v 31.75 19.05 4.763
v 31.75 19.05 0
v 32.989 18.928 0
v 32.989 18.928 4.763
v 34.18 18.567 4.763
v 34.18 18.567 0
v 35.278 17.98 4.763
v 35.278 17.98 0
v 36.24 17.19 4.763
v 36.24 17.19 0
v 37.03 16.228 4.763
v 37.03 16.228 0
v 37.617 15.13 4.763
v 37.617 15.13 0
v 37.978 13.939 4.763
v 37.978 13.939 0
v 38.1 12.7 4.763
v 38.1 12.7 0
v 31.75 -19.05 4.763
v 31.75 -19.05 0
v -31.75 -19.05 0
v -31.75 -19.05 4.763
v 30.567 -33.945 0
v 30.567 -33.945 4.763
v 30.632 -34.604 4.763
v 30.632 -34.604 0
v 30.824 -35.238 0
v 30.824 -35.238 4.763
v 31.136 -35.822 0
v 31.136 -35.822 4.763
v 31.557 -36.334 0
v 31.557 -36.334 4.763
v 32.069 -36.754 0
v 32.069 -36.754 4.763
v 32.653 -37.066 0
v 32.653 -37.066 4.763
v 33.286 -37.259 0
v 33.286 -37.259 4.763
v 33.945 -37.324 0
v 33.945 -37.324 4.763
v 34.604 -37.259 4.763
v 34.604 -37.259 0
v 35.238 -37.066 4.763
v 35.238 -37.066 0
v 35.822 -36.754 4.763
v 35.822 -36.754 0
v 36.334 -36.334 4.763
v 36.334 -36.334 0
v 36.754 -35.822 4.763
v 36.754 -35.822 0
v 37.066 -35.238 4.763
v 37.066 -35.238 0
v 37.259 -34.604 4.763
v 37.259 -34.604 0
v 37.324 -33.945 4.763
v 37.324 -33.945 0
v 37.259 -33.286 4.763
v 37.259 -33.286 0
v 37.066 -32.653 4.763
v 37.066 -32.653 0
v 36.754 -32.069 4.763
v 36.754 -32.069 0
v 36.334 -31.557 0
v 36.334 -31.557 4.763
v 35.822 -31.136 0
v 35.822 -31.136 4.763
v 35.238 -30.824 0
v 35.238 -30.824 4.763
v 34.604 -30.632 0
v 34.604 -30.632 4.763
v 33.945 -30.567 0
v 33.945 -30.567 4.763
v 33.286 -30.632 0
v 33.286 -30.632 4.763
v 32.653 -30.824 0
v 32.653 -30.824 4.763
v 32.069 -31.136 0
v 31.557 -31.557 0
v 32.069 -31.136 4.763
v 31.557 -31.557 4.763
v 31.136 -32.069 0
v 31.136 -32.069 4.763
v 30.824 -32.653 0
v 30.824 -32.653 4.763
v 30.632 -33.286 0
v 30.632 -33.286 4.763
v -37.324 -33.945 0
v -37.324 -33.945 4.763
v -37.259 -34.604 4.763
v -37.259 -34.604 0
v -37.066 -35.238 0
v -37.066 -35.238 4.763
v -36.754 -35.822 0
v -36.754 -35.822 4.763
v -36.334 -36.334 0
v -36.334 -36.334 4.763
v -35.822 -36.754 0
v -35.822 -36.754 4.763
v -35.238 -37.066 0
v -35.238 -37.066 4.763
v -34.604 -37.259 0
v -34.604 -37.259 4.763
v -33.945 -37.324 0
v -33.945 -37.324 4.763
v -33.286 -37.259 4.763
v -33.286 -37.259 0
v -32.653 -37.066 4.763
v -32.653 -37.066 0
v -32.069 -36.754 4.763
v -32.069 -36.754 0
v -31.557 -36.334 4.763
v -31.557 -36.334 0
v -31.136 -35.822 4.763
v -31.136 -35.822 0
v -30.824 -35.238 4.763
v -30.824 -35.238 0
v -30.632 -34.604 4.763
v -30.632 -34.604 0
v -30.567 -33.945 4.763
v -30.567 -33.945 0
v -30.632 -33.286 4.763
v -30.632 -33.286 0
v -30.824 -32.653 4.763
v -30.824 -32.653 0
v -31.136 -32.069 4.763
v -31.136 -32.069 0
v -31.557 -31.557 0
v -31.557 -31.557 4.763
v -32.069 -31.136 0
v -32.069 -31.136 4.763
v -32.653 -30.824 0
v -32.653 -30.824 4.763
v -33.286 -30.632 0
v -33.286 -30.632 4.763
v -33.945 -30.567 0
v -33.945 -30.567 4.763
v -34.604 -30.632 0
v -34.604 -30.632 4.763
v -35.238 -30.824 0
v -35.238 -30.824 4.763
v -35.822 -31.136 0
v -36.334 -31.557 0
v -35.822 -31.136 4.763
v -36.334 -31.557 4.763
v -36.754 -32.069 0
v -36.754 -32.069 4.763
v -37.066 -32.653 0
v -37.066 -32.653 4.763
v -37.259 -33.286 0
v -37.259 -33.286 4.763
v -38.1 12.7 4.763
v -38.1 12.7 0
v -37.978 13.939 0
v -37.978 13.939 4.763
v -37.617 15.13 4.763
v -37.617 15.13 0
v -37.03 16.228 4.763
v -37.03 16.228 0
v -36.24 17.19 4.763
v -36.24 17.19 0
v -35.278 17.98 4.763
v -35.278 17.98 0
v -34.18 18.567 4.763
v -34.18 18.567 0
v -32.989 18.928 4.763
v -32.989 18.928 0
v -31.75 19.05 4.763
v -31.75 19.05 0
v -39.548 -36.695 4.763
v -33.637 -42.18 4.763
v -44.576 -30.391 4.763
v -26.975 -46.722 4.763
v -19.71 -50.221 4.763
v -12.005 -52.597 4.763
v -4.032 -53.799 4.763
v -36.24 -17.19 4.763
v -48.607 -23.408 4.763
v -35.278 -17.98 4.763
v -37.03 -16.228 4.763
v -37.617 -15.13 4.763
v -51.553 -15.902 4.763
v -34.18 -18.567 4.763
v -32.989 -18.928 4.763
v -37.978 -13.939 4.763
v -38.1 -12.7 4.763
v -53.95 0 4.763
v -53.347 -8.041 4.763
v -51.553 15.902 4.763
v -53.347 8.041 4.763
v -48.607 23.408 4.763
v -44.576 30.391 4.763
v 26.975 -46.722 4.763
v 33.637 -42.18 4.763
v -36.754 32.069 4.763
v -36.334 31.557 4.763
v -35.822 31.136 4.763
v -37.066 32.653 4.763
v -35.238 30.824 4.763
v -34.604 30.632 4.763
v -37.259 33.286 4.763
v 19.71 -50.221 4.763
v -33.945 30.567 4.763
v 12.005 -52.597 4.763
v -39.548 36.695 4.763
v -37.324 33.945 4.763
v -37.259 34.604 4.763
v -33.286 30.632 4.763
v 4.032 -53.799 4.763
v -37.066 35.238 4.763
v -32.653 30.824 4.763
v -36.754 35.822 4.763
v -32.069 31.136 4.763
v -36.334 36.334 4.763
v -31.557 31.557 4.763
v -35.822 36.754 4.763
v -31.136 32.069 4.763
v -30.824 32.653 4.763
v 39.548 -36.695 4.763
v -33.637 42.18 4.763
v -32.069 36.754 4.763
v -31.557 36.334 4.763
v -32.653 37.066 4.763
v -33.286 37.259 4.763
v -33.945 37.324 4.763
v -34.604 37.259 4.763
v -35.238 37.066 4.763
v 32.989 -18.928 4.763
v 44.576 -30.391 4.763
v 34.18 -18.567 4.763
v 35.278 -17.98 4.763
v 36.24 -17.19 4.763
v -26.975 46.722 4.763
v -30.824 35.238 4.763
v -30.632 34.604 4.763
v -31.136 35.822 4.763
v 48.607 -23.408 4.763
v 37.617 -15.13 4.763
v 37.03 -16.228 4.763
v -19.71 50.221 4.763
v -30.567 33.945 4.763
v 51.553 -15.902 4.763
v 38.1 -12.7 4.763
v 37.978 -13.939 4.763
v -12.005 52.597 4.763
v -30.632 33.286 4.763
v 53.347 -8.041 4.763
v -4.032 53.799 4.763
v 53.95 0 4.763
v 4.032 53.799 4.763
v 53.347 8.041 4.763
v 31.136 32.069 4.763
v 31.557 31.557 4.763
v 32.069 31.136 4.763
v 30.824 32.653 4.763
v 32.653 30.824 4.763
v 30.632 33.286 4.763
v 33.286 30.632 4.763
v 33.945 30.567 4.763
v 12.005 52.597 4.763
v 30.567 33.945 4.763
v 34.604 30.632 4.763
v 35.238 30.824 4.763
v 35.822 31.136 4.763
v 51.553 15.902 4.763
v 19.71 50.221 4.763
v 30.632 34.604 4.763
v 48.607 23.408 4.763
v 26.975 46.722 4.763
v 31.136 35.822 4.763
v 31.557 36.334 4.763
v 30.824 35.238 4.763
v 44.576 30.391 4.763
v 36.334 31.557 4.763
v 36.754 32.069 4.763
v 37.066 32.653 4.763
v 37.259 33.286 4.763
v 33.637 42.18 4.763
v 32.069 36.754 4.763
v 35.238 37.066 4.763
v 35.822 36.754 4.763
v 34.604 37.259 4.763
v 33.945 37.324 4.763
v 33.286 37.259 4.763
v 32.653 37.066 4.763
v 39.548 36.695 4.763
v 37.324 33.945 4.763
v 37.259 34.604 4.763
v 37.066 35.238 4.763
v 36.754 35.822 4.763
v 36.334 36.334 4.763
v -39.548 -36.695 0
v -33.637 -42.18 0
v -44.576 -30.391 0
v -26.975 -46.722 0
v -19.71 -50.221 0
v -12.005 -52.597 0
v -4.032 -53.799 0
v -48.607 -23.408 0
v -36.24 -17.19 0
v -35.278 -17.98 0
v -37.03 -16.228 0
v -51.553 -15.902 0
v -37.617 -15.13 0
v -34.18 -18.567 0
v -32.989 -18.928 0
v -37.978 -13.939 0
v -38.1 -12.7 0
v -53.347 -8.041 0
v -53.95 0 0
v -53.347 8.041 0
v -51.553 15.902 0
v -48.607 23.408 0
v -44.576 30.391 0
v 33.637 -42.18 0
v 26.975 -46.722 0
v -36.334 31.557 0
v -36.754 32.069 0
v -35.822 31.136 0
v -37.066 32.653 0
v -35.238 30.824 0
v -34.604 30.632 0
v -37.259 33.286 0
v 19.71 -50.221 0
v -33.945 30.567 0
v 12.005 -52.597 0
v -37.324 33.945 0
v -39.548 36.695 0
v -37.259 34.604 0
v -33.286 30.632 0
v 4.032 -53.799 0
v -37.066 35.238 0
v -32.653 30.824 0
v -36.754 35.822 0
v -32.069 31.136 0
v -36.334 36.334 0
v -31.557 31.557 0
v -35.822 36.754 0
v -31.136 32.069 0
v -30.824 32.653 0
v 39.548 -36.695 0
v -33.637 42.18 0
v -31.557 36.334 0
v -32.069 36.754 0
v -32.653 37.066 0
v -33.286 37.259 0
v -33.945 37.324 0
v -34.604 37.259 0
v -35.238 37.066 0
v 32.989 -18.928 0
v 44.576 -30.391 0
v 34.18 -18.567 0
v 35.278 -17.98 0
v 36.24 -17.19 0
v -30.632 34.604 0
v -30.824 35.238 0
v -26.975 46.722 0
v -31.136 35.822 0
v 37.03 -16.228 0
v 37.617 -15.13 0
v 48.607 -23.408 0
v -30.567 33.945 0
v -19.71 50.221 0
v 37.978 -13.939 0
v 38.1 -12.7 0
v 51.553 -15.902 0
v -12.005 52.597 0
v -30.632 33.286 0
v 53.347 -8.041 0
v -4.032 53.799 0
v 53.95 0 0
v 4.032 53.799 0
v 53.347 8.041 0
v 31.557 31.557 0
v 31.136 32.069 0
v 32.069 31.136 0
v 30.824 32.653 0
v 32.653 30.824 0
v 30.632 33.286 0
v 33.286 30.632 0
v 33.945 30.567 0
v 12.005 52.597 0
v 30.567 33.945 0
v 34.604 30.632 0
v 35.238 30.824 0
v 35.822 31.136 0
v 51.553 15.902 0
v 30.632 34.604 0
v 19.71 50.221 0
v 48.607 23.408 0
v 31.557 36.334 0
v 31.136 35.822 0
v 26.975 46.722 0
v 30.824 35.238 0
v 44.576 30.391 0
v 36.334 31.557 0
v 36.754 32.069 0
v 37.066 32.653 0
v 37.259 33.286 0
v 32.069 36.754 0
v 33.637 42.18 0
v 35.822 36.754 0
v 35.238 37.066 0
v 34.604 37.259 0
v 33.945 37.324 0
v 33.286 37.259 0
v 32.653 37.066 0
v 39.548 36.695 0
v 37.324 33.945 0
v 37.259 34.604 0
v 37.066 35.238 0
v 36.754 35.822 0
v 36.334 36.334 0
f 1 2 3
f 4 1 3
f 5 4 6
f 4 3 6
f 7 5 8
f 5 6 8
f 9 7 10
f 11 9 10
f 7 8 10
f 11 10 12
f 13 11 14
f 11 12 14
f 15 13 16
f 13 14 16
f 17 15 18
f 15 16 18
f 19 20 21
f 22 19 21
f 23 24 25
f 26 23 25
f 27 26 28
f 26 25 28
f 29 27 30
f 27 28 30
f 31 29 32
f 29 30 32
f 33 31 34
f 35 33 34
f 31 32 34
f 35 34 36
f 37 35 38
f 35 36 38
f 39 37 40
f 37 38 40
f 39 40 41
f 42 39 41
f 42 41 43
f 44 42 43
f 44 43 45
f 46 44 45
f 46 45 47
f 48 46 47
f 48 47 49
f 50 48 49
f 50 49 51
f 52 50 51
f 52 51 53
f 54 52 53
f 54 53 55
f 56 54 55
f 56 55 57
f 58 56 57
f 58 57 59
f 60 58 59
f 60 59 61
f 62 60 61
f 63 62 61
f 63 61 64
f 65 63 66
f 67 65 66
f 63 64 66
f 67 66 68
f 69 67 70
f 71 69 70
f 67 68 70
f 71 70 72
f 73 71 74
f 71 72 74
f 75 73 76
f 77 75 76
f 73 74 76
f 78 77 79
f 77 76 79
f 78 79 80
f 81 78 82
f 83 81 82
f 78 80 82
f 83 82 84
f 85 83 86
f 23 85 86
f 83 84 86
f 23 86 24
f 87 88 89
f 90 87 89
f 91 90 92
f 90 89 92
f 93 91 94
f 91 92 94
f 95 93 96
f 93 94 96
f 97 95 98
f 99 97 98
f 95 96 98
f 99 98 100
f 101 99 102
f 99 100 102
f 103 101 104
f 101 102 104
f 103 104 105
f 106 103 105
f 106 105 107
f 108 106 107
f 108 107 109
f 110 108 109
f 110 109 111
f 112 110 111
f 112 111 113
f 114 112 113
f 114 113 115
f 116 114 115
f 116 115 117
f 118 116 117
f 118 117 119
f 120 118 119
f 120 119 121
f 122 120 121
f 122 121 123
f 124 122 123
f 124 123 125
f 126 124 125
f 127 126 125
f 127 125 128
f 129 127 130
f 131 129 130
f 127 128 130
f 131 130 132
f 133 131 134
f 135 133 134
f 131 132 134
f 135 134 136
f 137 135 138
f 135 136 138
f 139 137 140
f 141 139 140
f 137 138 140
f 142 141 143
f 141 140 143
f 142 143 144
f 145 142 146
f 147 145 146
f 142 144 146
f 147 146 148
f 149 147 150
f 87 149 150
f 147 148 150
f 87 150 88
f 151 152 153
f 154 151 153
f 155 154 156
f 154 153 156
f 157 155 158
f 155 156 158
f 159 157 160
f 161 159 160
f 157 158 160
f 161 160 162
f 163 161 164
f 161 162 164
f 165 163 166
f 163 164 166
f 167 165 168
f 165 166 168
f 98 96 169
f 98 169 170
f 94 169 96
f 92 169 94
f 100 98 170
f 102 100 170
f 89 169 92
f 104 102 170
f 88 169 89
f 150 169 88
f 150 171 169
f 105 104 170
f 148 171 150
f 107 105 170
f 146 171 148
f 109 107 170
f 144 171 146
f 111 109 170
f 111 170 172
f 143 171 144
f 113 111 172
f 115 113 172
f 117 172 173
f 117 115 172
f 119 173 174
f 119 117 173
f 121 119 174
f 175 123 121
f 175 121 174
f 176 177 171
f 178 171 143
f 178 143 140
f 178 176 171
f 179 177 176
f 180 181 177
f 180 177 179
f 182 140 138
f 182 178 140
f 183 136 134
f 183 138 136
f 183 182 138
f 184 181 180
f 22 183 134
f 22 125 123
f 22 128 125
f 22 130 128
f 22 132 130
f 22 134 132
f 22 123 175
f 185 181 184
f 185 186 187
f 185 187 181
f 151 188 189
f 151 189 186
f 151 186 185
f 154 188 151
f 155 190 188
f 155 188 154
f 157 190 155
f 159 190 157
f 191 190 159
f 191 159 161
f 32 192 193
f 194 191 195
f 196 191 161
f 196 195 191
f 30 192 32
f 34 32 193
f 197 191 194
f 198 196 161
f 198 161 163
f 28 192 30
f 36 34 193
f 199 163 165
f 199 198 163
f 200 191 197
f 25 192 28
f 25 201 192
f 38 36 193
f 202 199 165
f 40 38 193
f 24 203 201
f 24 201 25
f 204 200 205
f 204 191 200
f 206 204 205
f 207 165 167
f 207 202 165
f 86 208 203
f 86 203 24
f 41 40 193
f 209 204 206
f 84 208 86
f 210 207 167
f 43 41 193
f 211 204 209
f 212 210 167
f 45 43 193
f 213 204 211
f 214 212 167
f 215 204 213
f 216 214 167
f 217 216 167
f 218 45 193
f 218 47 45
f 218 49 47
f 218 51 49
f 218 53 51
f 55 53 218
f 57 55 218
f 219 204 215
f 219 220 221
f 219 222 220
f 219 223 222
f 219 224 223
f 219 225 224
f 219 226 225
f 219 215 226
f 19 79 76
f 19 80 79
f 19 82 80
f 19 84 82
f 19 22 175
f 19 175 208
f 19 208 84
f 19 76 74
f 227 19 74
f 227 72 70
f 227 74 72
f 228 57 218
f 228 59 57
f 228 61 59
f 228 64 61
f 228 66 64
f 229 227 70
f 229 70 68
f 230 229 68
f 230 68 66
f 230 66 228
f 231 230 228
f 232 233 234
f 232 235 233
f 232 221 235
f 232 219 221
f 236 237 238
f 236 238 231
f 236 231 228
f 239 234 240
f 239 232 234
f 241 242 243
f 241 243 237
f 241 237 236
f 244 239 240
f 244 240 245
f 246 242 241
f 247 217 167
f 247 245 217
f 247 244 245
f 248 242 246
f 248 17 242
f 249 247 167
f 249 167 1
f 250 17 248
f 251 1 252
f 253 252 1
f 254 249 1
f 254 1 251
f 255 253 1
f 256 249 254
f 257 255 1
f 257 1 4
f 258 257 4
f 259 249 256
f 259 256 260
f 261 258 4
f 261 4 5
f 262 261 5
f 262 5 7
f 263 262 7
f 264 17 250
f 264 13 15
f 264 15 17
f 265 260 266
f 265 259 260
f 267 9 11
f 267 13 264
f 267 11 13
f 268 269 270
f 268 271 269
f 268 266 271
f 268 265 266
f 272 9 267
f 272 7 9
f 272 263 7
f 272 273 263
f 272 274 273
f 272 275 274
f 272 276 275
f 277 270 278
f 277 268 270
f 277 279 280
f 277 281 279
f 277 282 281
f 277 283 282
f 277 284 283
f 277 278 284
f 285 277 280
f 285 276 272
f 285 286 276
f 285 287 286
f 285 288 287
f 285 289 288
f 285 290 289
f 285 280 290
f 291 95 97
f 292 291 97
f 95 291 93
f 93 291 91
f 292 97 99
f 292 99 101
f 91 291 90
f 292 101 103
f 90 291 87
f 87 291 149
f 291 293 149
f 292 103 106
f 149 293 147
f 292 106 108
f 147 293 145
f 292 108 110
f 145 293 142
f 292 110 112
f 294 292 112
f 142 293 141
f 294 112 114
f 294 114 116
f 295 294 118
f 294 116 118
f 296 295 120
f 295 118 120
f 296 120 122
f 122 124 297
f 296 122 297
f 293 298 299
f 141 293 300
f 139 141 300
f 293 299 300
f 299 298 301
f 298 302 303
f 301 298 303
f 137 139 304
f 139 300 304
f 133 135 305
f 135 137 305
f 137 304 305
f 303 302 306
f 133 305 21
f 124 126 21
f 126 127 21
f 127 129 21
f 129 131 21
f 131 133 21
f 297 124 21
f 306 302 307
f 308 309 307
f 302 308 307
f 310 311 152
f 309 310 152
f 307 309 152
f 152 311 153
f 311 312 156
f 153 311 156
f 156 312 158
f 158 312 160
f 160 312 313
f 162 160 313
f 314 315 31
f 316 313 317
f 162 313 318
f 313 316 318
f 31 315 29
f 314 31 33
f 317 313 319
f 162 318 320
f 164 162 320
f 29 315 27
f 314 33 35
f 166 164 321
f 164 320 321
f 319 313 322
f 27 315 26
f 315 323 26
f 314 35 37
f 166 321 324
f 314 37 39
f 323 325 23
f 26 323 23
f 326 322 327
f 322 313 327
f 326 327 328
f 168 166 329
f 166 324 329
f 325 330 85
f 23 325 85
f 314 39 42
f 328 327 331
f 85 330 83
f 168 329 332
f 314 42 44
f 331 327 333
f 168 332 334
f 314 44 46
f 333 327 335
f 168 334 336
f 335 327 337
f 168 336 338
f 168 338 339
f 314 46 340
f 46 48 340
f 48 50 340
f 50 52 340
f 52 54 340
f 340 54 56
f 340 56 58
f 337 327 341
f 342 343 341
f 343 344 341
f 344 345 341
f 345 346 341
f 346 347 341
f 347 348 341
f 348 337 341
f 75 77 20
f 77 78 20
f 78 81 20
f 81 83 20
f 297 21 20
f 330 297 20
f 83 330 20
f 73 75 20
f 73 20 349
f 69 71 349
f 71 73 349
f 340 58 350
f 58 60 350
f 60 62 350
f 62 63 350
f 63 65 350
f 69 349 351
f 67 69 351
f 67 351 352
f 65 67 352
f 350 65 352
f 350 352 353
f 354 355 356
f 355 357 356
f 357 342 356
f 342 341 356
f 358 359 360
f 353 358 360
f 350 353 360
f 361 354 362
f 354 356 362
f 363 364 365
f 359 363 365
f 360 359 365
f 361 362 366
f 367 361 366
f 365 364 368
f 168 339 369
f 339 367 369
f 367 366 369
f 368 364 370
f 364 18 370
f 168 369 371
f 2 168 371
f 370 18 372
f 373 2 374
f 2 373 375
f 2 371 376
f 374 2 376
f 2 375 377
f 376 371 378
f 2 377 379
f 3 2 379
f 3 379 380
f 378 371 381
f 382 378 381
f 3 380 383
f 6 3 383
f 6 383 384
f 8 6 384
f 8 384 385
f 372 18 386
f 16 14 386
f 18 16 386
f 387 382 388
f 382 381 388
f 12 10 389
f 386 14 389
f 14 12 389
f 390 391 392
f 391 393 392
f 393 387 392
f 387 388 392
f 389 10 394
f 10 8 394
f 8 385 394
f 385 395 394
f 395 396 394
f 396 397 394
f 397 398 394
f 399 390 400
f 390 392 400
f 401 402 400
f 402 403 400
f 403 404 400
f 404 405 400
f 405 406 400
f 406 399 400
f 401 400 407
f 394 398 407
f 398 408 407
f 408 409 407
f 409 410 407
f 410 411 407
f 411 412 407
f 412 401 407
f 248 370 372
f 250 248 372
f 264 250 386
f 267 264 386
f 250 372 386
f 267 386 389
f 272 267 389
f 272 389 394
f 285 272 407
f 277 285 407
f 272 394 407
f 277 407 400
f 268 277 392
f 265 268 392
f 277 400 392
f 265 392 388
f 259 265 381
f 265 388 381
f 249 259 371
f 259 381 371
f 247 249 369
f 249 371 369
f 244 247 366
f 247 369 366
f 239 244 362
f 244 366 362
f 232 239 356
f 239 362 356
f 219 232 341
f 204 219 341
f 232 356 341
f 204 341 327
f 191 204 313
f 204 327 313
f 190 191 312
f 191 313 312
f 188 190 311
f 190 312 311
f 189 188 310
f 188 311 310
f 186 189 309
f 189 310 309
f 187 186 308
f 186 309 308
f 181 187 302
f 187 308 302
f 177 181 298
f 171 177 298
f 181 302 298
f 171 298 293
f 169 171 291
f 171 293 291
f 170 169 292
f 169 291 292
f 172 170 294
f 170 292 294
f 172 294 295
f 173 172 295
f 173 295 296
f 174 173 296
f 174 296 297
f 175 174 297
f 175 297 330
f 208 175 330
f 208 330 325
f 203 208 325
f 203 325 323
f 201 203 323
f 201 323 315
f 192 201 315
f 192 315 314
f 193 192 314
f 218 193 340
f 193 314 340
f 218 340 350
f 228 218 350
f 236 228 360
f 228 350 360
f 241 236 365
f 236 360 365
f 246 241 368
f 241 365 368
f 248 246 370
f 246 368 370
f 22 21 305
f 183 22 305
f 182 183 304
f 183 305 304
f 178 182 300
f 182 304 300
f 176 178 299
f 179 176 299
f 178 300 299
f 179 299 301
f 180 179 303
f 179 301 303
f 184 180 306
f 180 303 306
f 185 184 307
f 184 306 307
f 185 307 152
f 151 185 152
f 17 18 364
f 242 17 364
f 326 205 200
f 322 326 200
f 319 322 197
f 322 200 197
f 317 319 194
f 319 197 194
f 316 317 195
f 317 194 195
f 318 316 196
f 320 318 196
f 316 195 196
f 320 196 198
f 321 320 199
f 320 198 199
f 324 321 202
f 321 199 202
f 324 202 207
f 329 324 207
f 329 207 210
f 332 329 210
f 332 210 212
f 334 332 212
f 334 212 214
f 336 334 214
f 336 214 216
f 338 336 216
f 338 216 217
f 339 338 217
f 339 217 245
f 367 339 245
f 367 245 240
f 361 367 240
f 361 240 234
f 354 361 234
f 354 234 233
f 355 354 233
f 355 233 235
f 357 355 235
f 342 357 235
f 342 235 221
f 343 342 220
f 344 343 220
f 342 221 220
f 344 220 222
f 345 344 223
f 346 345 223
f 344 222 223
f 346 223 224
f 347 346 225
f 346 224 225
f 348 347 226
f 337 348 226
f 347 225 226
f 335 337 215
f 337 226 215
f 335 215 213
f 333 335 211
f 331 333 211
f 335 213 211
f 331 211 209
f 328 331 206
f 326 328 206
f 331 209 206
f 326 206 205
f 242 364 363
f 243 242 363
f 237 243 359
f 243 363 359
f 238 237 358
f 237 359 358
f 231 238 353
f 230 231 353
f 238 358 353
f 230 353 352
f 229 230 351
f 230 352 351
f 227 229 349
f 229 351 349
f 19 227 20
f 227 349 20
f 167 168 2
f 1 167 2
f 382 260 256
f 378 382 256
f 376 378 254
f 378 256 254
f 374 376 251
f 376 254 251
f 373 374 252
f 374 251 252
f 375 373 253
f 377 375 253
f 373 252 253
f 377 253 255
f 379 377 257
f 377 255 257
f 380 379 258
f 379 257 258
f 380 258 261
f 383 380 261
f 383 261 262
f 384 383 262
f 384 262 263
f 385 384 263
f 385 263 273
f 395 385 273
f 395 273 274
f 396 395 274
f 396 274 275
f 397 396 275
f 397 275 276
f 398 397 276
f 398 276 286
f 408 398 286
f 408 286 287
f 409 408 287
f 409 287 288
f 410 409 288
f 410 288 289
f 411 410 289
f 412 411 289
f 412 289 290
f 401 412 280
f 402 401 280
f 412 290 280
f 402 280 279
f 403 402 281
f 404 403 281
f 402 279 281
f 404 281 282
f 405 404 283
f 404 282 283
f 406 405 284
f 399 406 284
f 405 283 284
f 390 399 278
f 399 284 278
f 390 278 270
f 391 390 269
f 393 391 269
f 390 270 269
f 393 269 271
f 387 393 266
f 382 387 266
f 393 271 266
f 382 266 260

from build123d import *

# Parameters (mm, degrees)
F0_R     = 53.95
F1_DEPTH = 4.763
F2_D     = 6.7564


with BuildPart() as f1:
    # F0 (on Top) → F1 (new body)
    with BuildSketch(Plane.XY):
        Circle(F0_R)
        with BuildLine():
            ThreePointArc((38.1, -12.7), (36.2401280605, -17.1901280605), (31.75, -19.05))
            Line((31.75, -19.05), (-31.75, -19.05))
            ThreePointArc((-31.75, -19.05), (-36.2401280605, -17.1901280605), (-38.1, -12.7))
            Line((-38.1, -12.7), (-38.1, 12.7))
            ThreePointArc((-38.1, 12.7), (-36.2401280605, 17.1901280605), (-31.75, 19.05))
            Line((-31.75, 19.05), (31.75, 19.05))
            ThreePointArc((31.75, 19.05), (36.2401280605, 17.1901280605), (38.1, 12.7))
            Line((38.1, 12.7), (38.1, -12.7))
        make_face(mode=Mode.SUBTRACT)
    extrude(amount=F1_DEPTH)

    # F2 (through all)
    with Locations(Plane(origin=(0, 0, 0), x_dir=(1, 0, 0), z_dir=(0, 0, -1))):
        with Locations((33.9453681376, -33.9453681376), (-33.9453681376, -33.9453681376), (-33.9453681376, 33.9453681376), (33.9453681376, 33.9453681376)):
            Hole(F2_D / 2)


solid = f1.part
